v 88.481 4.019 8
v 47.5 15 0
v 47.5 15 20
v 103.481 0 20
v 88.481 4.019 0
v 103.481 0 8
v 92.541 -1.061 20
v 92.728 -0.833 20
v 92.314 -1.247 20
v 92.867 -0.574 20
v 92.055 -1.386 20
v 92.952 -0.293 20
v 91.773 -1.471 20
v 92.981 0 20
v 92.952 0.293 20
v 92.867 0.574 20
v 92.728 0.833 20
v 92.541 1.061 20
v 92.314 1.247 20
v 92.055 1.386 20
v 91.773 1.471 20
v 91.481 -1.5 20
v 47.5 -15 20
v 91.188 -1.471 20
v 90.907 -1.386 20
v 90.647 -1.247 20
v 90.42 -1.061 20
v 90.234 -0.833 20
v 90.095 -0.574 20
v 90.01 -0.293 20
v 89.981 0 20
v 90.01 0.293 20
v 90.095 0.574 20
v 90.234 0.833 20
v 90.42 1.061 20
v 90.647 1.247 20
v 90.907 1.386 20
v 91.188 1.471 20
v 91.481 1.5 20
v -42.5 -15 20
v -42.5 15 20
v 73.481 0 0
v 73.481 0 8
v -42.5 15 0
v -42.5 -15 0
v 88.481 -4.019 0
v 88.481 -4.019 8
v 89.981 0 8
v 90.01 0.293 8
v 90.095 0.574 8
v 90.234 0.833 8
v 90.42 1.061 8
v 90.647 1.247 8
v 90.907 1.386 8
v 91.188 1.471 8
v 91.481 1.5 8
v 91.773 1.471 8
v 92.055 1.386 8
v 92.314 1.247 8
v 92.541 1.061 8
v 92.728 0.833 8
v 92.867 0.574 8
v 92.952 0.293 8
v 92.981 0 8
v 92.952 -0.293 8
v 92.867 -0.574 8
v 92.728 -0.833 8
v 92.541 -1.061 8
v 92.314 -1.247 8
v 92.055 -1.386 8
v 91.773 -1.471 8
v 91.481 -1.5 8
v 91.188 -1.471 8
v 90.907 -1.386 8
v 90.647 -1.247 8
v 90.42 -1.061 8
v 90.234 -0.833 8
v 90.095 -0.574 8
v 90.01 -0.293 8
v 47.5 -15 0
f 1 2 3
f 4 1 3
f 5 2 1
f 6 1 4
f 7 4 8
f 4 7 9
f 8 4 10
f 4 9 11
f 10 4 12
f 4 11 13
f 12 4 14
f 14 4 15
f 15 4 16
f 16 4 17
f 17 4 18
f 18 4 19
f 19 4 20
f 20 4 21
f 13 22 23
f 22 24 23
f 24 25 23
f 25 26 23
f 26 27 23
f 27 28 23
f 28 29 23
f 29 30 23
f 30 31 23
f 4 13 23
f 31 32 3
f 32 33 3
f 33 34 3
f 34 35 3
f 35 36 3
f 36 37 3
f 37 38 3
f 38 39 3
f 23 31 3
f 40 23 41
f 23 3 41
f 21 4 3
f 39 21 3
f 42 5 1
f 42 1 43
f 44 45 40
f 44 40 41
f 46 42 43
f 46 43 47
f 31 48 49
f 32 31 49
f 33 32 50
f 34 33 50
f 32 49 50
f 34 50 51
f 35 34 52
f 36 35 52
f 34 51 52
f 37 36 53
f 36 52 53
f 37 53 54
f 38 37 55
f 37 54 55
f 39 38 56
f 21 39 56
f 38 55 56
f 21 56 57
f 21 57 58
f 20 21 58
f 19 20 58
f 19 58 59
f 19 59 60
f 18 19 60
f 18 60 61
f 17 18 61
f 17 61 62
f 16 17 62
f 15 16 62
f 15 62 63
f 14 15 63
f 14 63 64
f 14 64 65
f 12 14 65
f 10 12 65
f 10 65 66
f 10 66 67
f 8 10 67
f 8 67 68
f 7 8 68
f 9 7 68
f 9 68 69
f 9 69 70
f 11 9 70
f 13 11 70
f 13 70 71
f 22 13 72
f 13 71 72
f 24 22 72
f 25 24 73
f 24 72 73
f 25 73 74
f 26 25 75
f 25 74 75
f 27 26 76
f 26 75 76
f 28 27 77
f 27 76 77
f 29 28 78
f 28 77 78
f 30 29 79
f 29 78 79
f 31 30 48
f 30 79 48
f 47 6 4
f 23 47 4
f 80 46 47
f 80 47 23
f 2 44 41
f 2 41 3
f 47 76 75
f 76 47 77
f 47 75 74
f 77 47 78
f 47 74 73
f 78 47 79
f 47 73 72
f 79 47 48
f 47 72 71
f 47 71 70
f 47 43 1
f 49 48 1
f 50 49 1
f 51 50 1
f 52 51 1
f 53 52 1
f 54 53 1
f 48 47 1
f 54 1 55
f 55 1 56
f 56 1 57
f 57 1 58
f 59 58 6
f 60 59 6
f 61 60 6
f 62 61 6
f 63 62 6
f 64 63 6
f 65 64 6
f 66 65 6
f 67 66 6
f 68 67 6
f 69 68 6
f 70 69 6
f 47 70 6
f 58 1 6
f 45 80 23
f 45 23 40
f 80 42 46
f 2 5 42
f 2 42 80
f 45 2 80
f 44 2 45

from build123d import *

# Parameters (mm, degrees)
EXTRUDE_1_DEPTH     = 20
CUT_EXTRUDE_1_DEPTH = 8
SKETCH_4_R          = 1.5
CUT_EXTRUDE_2_DEPTH = 13


with BuildPart() as part:
    # 草图1 → 凸台-拉伸1 (new body)
    with BuildSketch(Plane.XY):
        Polygon((47.5, 15), (103.480762114, 0), (47.5, -15), (-42.5, -15), (-42.5, 15), align=None)
    extrude(amount=EXTRUDE_1_DEPTH)

    # 草图2 → 切除-拉伸1 (cut)
    with BuildSketch(Plane(origin=(0, 0, 0), x_dir=(-1, 0, 0), z_dir=(0, 0, -1))):
        Polygon((-88.480762114, 4.019237886), (-73.480762114, 0), (-88.480762114, -4.019237886), (-103.480762114, 0), align=None)
    extrude(amount=-CUT_EXTRUDE_1_DEPTH, mode=Mode.SUBTRACT)

    # 草图4 → 切除-拉伸2 (cut, through all)
    with BuildSketch(Plane(origin=(0, 0, 8), x_dir=(-1, 0, 0), z_dir=(0, 0, -1))):
        with Locations((-91.480762114, 0)):
            Circle(SKETCH_4_R)
    extrude(amount=-CUT_EXTRUDE_2_DEPTH, mode=Mode.SUBTRACT)


solid = part.part
